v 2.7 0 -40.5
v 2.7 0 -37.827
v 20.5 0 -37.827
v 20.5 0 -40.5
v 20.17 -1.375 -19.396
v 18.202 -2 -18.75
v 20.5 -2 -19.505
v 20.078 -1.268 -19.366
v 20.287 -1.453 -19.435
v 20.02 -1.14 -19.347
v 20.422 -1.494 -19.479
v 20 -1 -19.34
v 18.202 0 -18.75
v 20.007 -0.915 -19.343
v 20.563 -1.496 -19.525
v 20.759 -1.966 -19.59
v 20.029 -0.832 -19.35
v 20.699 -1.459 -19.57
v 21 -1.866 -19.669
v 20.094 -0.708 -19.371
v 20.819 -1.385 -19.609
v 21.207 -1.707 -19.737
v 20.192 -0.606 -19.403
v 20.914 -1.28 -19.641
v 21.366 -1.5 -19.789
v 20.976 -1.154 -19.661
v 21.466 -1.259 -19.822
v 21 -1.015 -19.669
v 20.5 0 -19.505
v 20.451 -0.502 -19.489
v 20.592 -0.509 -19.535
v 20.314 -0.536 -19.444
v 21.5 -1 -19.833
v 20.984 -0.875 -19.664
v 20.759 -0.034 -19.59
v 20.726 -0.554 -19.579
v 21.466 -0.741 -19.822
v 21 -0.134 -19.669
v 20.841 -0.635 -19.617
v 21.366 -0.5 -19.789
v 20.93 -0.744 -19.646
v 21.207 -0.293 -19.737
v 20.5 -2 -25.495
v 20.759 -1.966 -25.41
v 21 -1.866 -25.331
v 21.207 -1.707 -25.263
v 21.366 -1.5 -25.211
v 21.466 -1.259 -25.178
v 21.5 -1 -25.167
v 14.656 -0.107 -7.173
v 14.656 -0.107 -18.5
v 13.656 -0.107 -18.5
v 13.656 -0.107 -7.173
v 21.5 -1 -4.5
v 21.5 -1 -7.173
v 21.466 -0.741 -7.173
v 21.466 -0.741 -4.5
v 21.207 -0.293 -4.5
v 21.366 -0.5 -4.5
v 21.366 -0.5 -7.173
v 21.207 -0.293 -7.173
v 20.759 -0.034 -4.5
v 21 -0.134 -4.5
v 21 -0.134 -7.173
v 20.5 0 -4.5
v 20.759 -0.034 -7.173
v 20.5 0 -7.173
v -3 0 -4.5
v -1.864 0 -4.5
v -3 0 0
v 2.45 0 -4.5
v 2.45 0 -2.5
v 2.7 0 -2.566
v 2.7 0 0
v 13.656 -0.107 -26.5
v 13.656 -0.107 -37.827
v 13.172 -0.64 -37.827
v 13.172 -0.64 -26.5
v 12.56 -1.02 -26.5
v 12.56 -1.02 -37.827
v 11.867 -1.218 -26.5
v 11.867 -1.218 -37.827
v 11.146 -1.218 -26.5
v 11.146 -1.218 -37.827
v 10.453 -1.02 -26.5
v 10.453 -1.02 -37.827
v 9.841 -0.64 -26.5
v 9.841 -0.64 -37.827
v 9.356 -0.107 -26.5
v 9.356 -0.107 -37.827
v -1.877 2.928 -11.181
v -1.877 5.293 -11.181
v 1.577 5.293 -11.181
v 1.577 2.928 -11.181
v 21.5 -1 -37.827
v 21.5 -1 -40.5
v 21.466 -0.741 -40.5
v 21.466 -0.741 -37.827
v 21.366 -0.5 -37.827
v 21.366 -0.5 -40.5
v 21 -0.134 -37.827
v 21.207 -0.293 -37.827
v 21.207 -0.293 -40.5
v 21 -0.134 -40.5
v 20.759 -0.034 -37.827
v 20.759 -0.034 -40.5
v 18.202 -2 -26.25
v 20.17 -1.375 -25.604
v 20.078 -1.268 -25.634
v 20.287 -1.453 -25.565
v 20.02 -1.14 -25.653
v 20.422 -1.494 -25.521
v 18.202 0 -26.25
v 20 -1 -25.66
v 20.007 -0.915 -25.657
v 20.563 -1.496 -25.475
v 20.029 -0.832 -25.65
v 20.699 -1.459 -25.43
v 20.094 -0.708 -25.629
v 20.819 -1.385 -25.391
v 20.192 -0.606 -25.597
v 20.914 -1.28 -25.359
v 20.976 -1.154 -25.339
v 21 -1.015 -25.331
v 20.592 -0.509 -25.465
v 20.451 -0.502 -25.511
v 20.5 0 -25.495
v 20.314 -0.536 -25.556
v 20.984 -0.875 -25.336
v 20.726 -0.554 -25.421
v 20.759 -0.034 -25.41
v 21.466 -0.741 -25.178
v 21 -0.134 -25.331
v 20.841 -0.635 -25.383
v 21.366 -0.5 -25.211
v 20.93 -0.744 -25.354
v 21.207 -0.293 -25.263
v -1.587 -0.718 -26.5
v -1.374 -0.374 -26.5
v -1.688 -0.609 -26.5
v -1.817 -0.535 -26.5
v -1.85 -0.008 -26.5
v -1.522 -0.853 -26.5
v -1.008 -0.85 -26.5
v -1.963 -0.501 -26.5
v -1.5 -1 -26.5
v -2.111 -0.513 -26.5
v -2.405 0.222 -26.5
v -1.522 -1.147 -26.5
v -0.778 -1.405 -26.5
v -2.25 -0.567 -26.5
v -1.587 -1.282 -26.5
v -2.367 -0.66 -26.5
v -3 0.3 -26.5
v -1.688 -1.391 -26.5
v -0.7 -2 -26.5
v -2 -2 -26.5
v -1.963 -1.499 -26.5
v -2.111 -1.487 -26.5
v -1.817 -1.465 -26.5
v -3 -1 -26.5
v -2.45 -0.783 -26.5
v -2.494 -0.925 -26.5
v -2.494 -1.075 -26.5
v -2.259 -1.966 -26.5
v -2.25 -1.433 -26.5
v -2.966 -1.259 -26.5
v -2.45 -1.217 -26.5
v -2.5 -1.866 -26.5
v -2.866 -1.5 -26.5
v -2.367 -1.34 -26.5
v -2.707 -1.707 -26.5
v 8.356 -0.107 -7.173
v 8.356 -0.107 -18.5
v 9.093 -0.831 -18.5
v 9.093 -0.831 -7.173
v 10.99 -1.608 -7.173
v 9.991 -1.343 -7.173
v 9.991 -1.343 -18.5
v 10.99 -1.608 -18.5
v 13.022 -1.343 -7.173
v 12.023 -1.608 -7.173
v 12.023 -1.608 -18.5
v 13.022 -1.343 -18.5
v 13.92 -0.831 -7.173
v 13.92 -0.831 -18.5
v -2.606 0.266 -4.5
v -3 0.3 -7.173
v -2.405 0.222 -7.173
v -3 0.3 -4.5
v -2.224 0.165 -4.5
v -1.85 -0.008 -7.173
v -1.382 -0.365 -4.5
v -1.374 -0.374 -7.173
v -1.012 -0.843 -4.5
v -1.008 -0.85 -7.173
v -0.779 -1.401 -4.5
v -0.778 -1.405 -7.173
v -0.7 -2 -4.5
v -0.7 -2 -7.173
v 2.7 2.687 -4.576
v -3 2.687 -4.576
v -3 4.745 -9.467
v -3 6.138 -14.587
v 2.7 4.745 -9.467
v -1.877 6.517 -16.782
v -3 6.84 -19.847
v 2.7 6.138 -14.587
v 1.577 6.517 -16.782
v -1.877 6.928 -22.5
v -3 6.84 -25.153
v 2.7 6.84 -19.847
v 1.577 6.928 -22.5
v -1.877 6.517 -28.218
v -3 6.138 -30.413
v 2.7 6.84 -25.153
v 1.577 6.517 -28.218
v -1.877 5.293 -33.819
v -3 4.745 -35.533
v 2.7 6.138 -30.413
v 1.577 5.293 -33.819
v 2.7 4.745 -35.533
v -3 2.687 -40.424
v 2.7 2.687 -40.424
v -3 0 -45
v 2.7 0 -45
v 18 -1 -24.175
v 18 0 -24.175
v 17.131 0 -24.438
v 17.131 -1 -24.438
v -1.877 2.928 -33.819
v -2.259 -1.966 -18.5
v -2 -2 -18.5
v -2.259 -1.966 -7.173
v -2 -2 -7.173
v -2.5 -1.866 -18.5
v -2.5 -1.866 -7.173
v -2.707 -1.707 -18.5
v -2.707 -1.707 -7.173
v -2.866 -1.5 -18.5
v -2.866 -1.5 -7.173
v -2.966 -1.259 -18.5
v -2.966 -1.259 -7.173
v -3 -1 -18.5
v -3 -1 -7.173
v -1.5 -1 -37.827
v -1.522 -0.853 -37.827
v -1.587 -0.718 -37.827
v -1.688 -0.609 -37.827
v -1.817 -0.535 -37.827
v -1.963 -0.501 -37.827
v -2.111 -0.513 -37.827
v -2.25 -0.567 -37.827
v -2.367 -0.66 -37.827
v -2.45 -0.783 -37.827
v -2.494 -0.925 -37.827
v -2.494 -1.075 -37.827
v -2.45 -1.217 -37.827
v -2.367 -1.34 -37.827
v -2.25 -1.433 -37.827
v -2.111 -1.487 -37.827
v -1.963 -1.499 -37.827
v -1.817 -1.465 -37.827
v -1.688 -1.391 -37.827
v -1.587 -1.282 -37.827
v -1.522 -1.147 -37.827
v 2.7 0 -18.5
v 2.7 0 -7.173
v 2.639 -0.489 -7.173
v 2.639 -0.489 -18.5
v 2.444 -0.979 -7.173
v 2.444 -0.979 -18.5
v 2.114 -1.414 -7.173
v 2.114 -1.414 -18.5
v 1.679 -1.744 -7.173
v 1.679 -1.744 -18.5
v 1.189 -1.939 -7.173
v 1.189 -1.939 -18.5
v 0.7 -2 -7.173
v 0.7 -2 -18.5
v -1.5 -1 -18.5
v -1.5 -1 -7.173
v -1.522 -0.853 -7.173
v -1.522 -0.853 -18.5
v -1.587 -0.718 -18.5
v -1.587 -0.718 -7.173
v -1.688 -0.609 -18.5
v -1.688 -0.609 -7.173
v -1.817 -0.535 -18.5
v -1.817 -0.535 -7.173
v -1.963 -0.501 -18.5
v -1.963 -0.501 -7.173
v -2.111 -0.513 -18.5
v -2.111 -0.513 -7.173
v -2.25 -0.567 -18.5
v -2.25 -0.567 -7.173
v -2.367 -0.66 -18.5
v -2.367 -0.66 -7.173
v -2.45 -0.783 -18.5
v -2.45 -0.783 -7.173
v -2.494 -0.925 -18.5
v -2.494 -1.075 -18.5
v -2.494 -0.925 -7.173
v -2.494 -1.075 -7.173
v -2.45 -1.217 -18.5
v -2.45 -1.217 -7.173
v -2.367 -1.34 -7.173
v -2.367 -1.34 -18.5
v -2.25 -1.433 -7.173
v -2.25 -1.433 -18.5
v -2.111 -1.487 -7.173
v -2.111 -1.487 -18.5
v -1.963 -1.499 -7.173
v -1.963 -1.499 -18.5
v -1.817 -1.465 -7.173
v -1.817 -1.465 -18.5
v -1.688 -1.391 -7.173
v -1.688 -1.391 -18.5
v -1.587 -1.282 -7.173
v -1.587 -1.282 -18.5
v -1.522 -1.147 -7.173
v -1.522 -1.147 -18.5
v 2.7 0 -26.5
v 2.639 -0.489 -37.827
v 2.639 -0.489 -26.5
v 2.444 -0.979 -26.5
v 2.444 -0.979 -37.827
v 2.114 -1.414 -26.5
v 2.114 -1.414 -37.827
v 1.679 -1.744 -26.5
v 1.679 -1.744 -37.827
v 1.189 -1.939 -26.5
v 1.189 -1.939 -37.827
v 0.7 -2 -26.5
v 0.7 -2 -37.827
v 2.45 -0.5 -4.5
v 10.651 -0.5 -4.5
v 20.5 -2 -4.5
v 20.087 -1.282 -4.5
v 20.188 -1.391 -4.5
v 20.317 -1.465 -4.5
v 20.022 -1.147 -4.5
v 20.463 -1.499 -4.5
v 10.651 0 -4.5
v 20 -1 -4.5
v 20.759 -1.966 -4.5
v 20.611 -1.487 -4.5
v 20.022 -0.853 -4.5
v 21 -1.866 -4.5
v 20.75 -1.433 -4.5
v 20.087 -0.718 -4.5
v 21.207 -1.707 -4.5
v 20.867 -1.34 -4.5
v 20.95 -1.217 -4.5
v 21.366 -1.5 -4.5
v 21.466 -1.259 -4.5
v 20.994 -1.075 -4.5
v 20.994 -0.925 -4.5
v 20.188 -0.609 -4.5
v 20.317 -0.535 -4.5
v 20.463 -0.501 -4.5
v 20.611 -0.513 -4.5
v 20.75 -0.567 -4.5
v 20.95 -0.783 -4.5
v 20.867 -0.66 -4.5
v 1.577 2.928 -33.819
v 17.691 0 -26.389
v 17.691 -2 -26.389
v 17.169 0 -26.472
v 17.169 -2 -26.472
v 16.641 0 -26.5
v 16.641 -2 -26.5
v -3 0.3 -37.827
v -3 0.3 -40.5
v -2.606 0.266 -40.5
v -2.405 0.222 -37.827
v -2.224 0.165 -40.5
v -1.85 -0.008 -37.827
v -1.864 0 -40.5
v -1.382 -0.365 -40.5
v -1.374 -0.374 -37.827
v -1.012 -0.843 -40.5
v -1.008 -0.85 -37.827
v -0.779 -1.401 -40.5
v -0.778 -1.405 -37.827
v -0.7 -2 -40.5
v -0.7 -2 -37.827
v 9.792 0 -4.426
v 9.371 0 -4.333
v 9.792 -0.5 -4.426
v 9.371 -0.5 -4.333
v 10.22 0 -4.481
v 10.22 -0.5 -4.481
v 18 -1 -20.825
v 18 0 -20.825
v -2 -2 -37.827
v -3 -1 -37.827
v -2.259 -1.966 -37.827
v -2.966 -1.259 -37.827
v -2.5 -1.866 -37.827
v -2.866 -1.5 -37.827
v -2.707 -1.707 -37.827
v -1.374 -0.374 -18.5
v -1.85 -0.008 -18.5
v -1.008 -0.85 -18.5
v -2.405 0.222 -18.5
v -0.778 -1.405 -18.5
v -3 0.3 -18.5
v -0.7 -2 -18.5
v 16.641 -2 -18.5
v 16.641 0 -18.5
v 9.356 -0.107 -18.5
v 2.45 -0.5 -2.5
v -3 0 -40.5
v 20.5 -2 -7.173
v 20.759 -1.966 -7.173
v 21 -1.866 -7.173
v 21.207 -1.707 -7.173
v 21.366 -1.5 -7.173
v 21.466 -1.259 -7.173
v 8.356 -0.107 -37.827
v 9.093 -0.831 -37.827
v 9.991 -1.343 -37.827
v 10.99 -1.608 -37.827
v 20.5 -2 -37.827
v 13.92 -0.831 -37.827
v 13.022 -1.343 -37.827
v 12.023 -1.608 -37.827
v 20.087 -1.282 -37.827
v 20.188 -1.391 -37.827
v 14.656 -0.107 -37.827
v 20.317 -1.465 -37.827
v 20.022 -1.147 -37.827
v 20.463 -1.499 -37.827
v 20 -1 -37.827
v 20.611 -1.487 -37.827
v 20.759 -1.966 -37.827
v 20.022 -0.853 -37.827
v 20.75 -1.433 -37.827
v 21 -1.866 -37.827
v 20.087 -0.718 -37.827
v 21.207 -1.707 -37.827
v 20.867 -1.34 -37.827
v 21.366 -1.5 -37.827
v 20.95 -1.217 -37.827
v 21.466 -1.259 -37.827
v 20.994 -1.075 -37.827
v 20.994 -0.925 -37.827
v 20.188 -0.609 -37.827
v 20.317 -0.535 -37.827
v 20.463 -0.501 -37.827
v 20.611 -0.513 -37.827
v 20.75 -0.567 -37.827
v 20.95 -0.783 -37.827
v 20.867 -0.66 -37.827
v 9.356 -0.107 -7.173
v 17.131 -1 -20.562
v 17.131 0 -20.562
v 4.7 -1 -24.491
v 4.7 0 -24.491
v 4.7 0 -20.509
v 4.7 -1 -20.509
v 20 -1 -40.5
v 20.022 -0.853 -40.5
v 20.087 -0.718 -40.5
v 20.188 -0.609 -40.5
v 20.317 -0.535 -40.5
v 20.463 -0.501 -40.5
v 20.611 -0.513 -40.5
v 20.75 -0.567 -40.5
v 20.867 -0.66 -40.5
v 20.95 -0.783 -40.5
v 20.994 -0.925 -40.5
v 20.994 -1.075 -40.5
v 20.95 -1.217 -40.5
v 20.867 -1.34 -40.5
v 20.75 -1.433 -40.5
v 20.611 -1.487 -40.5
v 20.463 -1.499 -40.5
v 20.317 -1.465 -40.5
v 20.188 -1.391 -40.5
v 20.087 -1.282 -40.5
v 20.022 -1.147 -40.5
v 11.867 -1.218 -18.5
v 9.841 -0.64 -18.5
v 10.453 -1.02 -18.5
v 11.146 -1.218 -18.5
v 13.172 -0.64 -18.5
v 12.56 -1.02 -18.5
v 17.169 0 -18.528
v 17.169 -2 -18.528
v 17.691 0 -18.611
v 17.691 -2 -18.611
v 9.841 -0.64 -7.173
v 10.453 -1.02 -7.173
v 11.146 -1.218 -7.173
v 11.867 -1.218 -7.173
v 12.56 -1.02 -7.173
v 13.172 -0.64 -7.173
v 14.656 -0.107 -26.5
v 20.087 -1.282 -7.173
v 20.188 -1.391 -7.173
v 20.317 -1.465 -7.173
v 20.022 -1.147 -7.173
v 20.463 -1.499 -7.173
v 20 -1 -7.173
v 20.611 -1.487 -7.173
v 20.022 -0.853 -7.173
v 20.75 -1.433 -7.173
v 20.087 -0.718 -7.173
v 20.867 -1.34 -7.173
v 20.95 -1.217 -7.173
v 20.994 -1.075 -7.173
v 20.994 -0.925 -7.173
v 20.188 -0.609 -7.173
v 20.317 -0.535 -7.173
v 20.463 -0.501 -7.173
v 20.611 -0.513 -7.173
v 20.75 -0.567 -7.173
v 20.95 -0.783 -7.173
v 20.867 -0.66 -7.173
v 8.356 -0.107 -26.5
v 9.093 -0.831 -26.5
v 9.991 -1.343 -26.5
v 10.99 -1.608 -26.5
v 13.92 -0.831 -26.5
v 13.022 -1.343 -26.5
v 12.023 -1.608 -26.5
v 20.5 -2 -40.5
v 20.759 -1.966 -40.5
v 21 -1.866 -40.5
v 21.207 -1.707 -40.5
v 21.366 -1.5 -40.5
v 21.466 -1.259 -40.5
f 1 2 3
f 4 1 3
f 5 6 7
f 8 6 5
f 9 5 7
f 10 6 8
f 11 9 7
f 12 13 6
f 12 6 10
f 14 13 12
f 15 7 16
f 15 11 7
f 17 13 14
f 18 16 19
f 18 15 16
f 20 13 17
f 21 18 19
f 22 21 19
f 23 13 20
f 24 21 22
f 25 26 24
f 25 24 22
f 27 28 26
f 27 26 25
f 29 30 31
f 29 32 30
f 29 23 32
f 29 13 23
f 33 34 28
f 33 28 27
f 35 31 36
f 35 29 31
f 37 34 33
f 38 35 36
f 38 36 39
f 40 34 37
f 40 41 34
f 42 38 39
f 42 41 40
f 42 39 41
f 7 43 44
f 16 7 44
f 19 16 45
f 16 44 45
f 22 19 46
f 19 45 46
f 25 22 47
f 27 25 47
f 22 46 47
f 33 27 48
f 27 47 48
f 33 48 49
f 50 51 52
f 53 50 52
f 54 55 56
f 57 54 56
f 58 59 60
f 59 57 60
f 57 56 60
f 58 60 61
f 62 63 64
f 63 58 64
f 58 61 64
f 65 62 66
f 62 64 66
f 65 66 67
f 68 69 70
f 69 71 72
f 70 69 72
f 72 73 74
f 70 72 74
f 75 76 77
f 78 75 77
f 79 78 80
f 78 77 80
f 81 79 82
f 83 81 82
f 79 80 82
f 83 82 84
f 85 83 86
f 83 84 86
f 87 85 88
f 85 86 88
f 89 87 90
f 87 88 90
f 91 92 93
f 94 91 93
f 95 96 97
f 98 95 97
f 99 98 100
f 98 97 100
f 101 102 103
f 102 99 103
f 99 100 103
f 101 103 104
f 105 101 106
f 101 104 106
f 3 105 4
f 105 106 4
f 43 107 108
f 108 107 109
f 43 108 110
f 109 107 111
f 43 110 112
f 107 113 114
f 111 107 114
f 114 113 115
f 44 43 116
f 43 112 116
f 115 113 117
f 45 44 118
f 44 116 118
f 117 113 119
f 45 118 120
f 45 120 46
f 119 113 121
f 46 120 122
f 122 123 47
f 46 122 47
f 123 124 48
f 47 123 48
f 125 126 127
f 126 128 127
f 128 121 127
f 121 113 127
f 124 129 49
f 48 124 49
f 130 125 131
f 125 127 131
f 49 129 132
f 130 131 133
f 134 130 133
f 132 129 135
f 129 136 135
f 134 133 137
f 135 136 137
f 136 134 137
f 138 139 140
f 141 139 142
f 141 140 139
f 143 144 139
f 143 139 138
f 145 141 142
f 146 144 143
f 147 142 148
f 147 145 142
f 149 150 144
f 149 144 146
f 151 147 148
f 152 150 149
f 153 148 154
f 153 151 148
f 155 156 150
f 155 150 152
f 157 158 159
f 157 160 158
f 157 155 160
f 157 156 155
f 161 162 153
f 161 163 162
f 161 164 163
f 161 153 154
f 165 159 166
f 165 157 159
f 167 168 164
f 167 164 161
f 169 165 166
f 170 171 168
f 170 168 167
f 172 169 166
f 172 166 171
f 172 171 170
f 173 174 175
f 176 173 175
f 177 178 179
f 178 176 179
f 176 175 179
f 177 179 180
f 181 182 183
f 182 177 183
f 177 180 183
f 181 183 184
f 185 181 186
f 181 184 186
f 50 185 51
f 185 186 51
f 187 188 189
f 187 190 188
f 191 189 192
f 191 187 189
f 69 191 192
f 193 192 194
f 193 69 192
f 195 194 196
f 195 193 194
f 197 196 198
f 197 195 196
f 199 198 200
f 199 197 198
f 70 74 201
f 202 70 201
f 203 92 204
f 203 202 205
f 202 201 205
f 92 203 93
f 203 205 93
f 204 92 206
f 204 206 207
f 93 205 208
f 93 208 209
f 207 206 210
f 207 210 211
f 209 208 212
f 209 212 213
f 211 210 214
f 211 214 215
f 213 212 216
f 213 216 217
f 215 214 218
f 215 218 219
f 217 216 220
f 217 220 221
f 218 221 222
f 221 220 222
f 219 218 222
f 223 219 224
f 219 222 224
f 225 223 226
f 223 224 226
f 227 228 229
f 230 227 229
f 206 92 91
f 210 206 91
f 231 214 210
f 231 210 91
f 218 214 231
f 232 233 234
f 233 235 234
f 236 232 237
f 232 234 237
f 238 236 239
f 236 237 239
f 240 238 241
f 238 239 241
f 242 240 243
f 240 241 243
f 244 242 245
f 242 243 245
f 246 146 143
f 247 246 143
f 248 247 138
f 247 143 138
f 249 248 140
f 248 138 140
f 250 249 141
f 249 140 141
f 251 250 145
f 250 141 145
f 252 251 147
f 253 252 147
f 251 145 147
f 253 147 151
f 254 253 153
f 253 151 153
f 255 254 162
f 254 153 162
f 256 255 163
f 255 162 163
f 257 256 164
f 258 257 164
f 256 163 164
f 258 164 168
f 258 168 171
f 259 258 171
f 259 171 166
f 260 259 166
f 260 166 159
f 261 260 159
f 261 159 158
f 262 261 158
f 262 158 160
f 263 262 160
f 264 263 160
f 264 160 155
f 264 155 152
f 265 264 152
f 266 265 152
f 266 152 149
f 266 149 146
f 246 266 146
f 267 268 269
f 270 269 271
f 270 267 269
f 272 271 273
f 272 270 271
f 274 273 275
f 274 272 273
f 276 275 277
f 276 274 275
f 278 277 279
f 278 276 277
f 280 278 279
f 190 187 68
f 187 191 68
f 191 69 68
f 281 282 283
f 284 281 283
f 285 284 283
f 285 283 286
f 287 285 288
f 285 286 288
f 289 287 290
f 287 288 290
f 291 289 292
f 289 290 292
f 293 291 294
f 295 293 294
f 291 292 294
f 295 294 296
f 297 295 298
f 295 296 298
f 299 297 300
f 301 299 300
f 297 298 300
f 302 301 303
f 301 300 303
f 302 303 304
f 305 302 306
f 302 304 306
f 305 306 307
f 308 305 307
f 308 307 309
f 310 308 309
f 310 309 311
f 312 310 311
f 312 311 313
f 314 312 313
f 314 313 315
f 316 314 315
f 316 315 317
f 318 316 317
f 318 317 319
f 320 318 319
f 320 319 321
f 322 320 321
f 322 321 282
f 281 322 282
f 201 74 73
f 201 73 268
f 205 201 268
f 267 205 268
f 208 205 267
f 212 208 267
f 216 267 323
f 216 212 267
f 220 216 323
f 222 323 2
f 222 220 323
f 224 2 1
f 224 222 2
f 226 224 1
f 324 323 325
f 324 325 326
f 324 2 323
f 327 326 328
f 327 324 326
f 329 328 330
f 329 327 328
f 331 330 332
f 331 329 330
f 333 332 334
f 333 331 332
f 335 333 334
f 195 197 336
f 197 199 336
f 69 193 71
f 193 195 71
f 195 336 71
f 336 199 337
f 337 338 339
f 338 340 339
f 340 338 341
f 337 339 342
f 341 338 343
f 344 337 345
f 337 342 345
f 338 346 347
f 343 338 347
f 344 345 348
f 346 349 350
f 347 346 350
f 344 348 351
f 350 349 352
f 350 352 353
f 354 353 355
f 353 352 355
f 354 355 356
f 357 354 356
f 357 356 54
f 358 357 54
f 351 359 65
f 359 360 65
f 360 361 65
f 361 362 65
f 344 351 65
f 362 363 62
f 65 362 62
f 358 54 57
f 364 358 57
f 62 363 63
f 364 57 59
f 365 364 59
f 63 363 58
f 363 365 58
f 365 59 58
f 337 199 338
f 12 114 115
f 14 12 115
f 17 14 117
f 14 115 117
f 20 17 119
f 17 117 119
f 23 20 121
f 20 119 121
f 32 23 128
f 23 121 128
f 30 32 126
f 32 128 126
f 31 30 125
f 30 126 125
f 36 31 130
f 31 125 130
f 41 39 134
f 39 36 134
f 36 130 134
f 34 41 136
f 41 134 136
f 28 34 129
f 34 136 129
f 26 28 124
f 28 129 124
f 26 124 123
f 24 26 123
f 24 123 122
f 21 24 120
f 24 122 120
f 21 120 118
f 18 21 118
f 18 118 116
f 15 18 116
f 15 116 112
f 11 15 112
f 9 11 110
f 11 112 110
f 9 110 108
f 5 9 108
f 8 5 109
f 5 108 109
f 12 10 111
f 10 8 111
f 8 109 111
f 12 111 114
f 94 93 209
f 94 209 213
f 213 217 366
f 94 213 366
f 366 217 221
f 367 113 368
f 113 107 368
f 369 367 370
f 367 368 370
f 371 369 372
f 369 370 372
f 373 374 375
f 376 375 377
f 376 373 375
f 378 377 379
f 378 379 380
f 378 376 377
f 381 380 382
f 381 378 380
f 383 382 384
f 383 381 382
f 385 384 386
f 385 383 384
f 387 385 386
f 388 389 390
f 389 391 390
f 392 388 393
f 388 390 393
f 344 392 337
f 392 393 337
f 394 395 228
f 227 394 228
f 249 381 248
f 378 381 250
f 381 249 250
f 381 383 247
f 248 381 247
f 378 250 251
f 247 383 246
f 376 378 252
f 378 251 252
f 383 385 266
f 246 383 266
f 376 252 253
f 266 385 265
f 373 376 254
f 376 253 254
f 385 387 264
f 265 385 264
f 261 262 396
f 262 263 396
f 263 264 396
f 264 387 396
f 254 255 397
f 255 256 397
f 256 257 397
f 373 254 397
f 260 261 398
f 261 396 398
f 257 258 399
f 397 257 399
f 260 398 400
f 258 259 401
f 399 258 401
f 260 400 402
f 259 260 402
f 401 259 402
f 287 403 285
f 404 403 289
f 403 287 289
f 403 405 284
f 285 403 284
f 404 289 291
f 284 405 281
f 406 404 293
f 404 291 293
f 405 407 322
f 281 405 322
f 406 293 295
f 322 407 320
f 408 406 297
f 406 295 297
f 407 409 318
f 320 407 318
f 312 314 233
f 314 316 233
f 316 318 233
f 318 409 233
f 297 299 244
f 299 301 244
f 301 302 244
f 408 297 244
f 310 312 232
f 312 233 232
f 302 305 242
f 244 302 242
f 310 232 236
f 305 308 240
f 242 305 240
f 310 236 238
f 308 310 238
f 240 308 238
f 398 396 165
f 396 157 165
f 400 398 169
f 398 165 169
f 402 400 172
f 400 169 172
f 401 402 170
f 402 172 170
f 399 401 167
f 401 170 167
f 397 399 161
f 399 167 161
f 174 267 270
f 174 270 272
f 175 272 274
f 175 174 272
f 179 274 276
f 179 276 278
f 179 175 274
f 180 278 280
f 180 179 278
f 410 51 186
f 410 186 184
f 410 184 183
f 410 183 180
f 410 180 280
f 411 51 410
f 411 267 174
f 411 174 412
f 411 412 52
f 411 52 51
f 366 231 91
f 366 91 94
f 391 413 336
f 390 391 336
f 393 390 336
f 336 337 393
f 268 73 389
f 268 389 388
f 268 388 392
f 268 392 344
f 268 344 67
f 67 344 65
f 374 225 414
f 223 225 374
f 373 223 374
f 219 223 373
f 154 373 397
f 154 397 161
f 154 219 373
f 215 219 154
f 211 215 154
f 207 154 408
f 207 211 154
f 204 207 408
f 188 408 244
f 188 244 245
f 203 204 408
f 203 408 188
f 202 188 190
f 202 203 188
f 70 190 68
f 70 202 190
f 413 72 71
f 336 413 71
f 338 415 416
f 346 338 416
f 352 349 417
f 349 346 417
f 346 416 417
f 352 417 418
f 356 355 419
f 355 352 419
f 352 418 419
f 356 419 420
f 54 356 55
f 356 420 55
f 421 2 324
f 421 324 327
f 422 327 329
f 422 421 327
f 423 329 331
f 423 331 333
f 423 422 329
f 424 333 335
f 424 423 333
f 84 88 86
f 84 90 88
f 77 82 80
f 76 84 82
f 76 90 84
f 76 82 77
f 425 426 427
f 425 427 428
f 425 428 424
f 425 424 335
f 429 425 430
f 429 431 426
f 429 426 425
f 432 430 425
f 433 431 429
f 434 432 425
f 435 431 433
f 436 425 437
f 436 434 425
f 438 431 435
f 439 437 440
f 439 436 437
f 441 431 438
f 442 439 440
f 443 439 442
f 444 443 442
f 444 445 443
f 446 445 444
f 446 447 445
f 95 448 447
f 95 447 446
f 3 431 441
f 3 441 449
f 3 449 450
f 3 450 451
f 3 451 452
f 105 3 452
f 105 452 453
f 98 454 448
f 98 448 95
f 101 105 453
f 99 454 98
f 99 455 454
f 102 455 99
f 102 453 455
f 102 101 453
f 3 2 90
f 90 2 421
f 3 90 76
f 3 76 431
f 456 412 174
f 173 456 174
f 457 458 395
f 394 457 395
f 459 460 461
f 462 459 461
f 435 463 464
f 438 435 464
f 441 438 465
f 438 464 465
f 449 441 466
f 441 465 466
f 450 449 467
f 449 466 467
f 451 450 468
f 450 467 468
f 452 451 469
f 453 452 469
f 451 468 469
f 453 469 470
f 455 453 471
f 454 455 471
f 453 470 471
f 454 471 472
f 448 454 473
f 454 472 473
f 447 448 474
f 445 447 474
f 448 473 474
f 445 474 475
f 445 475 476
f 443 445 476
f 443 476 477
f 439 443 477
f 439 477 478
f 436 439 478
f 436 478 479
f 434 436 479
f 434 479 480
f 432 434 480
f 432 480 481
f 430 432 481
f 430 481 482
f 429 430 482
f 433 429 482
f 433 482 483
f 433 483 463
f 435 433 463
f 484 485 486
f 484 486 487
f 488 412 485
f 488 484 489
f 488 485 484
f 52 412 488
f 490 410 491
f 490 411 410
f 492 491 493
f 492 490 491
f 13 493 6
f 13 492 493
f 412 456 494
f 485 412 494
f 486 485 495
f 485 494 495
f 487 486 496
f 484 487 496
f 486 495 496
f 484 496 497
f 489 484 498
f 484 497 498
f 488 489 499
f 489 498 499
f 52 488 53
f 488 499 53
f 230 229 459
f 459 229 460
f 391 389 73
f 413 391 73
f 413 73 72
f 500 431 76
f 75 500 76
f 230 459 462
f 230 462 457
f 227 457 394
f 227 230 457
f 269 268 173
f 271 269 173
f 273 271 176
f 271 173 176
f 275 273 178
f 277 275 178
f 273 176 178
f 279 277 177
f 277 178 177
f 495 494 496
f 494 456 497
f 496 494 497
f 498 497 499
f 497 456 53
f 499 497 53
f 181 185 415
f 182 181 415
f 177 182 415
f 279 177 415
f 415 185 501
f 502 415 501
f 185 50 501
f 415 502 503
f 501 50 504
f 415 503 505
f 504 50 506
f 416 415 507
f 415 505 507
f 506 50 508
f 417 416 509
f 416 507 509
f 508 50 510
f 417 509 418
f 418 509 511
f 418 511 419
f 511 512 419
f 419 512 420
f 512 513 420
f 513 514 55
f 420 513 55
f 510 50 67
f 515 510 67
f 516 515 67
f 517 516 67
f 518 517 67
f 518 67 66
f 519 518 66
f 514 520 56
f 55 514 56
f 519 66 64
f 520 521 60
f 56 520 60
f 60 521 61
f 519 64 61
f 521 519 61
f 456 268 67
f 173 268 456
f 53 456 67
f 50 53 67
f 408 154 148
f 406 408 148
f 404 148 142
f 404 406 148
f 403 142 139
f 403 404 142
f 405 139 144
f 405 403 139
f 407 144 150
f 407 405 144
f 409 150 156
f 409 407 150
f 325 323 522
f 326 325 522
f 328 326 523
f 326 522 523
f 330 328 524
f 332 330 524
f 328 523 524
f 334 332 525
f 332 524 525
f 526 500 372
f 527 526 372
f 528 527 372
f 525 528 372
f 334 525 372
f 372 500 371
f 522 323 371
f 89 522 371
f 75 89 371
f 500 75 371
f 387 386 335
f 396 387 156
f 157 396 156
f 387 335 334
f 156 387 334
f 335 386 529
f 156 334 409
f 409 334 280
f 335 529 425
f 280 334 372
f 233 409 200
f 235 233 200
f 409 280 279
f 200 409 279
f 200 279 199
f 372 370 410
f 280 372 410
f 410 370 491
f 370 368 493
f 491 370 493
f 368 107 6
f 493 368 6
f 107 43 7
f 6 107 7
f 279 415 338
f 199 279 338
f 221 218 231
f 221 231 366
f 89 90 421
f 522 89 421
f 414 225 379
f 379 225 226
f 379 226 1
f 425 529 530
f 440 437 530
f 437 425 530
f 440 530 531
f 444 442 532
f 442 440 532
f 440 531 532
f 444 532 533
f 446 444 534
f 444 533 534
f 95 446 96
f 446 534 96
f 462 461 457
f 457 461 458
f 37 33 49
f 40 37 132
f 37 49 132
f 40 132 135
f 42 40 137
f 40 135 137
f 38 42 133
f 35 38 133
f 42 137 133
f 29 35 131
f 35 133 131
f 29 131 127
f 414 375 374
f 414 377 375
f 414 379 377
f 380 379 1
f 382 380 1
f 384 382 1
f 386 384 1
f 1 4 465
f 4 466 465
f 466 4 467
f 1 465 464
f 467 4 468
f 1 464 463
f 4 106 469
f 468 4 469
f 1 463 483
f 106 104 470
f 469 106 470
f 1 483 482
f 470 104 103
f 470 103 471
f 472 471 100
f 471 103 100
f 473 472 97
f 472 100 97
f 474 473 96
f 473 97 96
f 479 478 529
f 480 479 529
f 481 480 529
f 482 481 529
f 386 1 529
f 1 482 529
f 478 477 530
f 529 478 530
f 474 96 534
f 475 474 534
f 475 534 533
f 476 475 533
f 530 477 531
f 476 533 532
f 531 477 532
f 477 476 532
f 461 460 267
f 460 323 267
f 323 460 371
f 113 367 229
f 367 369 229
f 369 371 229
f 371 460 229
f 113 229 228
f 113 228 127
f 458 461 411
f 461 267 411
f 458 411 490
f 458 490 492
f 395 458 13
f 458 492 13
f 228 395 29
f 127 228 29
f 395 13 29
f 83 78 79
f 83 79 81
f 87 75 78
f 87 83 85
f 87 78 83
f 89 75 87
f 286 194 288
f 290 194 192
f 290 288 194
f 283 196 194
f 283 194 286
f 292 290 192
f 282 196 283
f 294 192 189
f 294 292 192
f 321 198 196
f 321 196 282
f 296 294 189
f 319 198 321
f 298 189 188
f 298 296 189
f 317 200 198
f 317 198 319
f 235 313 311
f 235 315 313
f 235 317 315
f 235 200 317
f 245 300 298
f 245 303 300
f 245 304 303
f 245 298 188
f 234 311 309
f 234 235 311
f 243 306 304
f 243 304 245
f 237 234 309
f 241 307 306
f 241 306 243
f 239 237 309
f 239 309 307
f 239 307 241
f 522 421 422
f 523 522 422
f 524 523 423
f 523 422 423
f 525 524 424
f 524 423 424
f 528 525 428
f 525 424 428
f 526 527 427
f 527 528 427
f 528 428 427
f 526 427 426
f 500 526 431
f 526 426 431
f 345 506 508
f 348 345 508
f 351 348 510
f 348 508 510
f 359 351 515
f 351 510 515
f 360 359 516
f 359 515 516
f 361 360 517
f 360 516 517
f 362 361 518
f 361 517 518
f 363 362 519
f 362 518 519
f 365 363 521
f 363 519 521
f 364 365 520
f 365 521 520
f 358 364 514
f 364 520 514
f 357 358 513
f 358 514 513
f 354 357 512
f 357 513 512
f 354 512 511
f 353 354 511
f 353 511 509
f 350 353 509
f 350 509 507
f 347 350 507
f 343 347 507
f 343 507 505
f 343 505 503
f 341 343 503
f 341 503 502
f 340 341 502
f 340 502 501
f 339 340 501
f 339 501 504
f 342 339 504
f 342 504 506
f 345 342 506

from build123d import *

# Parameters (mm, degrees)
BOSS_EXTRUDE1_DEPTH  = 2.7
SKETCH6_W            = 21.5
SKETCH6_H            = 36
BOSS_EXTRUDE2_DEPTH  = 2
SKETCH7_W            = 18.8
SKETCH7_H            = 11.32703558
CUT_EXTRUDE3_DEPTH   = 2
CUT_EXTRUDE4_DEPTH   = 41.5
SKETCH10_R           = 0.5
CUT_EXTRUDE5_DEPTH   = 41.5
CUT_EXTRUDE15_DEPTH  = 16
FILLET6_R            = 5
BOSS_EXTRUDE6_DEPTH  = 36
CUT_EXTRUDE18_DEPTH  = 1
CUT_EXTRUDE22_DEPTH  = 11.327036
CUT_EXTRUDE23_DEPTH  = 11.327036
BOSS_EXTRUDE10_DEPTH = 3
SKETCH43_W           = 2.3
SKETCH43_H           = 2.67296442
SKETCH43_H_2         = 8
SKETCH45_R           = 0.5
CUT_EXTRUDE26_DEPTH  = 38.82703558
SKETCH47_W           = 3.454078762
SKETCH47_H           = 22.63811533
CUT_EXTRUDE27_DEPTH  = 4
FILLET13_R           = 2
FILLET15_R           = 1
BOSS_EXTRUDE5_DEPTH  = 0.5
FILLET7_R            = 5


with BuildPart() as part:
    # Sketch3 → Boss-Extrude1 (new body)
    with BuildSketch(Plane(origin=(0, 0, 0), x_dir=(0, 0, -1), z_dir=(1, 0, 0))):
        with BuildLine():
            Line((0, 0), (45, 0))
            ThreePointArc((45, 0), (22.5, 6.928108612), (0, 0))
        make_face()
    extrude(amount=BOSS_EXTRUDE1_DEPTH)

    # Sketch6 → Boss-Extrude2 (add)
    with BuildSketch(Plane.XZ):
        with Locations((10.75, -22.5)):
            Rectangle(SKETCH6_W, SKETCH6_H)
    extrude(amount=BOSS_EXTRUDE2_DEPTH)

    # Sketch7 → Cut-Extrude3 (cut)
    with BuildSketch(Plane(origin=(0, 0, 0), x_dir=(1, 0, 0), z_dir=(0, 1, 0))):
        with Locations((12.1, 32.16351779)):
            Rectangle(SKETCH7_W, SKETCH7_H)
        with Locations((12.1, 12.83648221)):
            Rectangle(SKETCH7_W, SKETCH7_H)
    extrude(amount=-CUT_EXTRUDE3_DEPTH, mode=Mode.SUBTRACT)

    # Sketch8 → Cut-Extrude4 (cut, through all)
    with BuildSketch(Plane(origin=(0, 0, -40.5), x_dir=(-1, 0, 0), z_dir=(0, 0, -1))):
        with BuildLine():
            ThreePointArc((-21.5, -1), (-21.207106781, -0.292893219), (-20.5, 0))
            Line((-20.5, 0), (-21.5, 0))
            Line((-21.5, 0), (-21.5, -1))
        make_face()
        with BuildLine():
            ThreePointArc((-20.5, -2), (-21.207106781, -1.707106781), (-21.5, -1))
            Line((-21.5, -1), (-21.5, -2))
            Line((-21.5, -2), (-20.5, -2))
        make_face()
    extrude(amount=-CUT_EXTRUDE4_DEPTH, mode=Mode.SUBTRACT)

    # Sketch10 → Cut-Extrude5 (cut, through all)
    with BuildSketch(Plane(origin=(0, 0, -40.5), x_dir=(-1, 0, 0), z_dir=(0, 0, -1))):
        with Locations((-20.5, -1)):
            Circle(SKETCH10_R)
    extrude(amount=-CUT_EXTRUDE5_DEPTH, mode=Mode.SUBTRACT)

    # Sketch23 → Cut-Extrude15 (cut)
    with BuildSketch(Plane(origin=(0, 0, 0), x_dir=(1, 0, 0), z_dir=(0, 1, 0))):
        Polygon((11.878000054, 16.672665213), (21.5, 19.832983358), (21.5, 13.512347067), align=None)
        Polygon((21.5, 25.167016642), (21.5, 31.487652933), (11.878000054, 28.327334787), align=None)
    extrude(amount=-CUT_EXTRUDE15_DEPTH, mode=Mode.SUBTRACT)

    # Fillet6
    fillet6_edges = [part.edges().sort_by_distance(p)[0] for p in [
        (17.441558662, -1, -26.5),
        (17.441558662, -1, -18.5),
    ]]
    fillet(fillet6_edges, radius=FILLET6_R)

    # Sketch31 → Boss-Extrude6 (add)
    with BuildSketch(Plane(origin=(0, 0, -40.5), x_dir=(-1, 0, 0), z_dir=(0, 0, -1))):
        with BuildLine():
            Line((-14.656442534, -0.106610148), (-8.356442534, -0.106610148))
            ThreePointArc((-8.356442534, -0.106610148), (-11.506442534, -1.641351541), (-14.656442534, -0.106610148))
        make_face()
    extrude(amount=-BOSS_EXTRUDE6_DEPTH)

    # Sketch30 → Cut-Extrude18 (cut)
    with BuildSketch(Plane(origin=(0, 0, 0), x_dir=(1, 0, 0), z_dir=(0, 1, 0))):
        Polygon((17.131265183, 24.438450908), (4.7, 24.491454375), (4.7, 20.508545625), (17.131265183, 20.561549092), (18, 20.824521551), (18, 24.175478449), align=None)
    extrude(amount=-CUT_EXTRUDE18_DEPTH, mode=Mode.SUBTRACT)

    # Sketch36 → Cut-Extrude22 (cut)
    with BuildSketch(Plane.XY.offset(-37.82703558)):
        with BuildLine():
            Line((9.356442534, -0.106610148), (13.656442534, -0.106610148))
            ThreePointArc((13.656442534, -0.106610148), (11.506442534, -1.243174514), (9.356442534, -0.106610148))
        make_face()
    extrude(amount=CUT_EXTRUDE22_DEPTH, mode=Mode.SUBTRACT)

    # Sketch37 → Cut-Extrude23 (cut)
    with BuildSketch(Plane(origin=(0, 0, -7.17296442), x_dir=(-1, 0, 0), z_dir=(0, 0, -1))):
        with BuildLine():
            Line((-13.656442534, -0.106610148), (-9.356442534, -0.106610148))
            ThreePointArc((-9.356442534, -0.106610148), (-11.506442534, -1.243174514), (-13.656442534, -0.106610148))
        make_face()
    extrude(amount=CUT_EXTRUDE23_DEPTH, mode=Mode.SUBTRACT)

    # Sketch42 → Boss-Extrude10 (add)
    with BuildSketch(Plane.ZY):
        with BuildLine():
            Line((-45, 0), (-40.5, 0))
            Line((-40.5, 0), (-40.5, -2))
            Line((-40.5, -2), (-4.5, -2))
            Line((-4.5, -2), (-4.5, 0))
            Line((-4.5, 0), (0, 0))
            ThreePointArc((0, 0), (-22.5, 6.928108612), (-45, 0))
        make_face()
    extrude(amount=BOSS_EXTRUDE10_DEPTH)

    # Sketch43 → Cut-Revolve7 (revolve, cut)
    with BuildSketch(Plane.XZ.offset(2)):
        with Locations((-1.85, -5.83648221)):
            Rectangle(SKETCH43_W, SKETCH43_H)
        with Locations((-1.85, -22.5)):
            Rectangle(SKETCH43_W, SKETCH43_H_2)
        with Locations((-1.85, -39.16351779)):
            Rectangle(SKETCH43_W, SKETCH43_H)
    revolve(axis=Axis((-3, -2, -4.5), (0, 0, -1)), mode=Mode.SUBTRACT)

    # Sketch45 → Cut-Extrude26 (cut, through all)
    with BuildSketch(Plane.XY.offset(-7.17296442)):
        with Locations((-2, -1)):
            Circle(SKETCH45_R)
    extrude(amount=-CUT_EXTRUDE26_DEPTH, mode=Mode.SUBTRACT)

    # Sketch47 → Cut-Extrude27 (cut)
    with BuildSketch(Plane(origin=(0, 6.928108612, 0), x_dir=(1, 0, 0), z_dir=(0, 1, 0))):
        with Locations((-0.15, 22.5)):
            Rectangle(SKETCH47_W, SKETCH47_H)
    extrude(amount=-CUT_EXTRUDE27_DEPTH, mode=Mode.SUBTRACT)

    # Fillet13
    fillet13_edges = [part.edges().sort_by_distance(p)[0] for p in [
        (2.7, -2, -12.83648221),
        (2.7, -2, -32.16351779),
    ]]
    fillet(fillet13_edges, radius=FILLET13_R)

    # Fillet15
    fillet15_edges = [part.edges().sort_by_distance(p)[0] for p in [
        (-3, -2, -32.16351779),
        (-3, -2, -12.83648221),
    ]]
    fillet(fillet15_edges, radius=FILLET15_R)

    # Sketch27 → Boss-Extrude5 (add)
    with BuildSketch(Plane.XZ):
        Polygon((2.45, -4.5), (10, -4.5), (2.45, -2.5), align=None)
    extrude(amount=BOSS_EXTRUDE5_DEPTH)

    # Fillet7
    fillet7_edges = [part.edges().sort_by_distance(p)[0] for p in [
        (10, -0.25, -4.5),
    ]]
    fillet(fillet7_edges, radius=FILLET7_R)


solid = part.part
